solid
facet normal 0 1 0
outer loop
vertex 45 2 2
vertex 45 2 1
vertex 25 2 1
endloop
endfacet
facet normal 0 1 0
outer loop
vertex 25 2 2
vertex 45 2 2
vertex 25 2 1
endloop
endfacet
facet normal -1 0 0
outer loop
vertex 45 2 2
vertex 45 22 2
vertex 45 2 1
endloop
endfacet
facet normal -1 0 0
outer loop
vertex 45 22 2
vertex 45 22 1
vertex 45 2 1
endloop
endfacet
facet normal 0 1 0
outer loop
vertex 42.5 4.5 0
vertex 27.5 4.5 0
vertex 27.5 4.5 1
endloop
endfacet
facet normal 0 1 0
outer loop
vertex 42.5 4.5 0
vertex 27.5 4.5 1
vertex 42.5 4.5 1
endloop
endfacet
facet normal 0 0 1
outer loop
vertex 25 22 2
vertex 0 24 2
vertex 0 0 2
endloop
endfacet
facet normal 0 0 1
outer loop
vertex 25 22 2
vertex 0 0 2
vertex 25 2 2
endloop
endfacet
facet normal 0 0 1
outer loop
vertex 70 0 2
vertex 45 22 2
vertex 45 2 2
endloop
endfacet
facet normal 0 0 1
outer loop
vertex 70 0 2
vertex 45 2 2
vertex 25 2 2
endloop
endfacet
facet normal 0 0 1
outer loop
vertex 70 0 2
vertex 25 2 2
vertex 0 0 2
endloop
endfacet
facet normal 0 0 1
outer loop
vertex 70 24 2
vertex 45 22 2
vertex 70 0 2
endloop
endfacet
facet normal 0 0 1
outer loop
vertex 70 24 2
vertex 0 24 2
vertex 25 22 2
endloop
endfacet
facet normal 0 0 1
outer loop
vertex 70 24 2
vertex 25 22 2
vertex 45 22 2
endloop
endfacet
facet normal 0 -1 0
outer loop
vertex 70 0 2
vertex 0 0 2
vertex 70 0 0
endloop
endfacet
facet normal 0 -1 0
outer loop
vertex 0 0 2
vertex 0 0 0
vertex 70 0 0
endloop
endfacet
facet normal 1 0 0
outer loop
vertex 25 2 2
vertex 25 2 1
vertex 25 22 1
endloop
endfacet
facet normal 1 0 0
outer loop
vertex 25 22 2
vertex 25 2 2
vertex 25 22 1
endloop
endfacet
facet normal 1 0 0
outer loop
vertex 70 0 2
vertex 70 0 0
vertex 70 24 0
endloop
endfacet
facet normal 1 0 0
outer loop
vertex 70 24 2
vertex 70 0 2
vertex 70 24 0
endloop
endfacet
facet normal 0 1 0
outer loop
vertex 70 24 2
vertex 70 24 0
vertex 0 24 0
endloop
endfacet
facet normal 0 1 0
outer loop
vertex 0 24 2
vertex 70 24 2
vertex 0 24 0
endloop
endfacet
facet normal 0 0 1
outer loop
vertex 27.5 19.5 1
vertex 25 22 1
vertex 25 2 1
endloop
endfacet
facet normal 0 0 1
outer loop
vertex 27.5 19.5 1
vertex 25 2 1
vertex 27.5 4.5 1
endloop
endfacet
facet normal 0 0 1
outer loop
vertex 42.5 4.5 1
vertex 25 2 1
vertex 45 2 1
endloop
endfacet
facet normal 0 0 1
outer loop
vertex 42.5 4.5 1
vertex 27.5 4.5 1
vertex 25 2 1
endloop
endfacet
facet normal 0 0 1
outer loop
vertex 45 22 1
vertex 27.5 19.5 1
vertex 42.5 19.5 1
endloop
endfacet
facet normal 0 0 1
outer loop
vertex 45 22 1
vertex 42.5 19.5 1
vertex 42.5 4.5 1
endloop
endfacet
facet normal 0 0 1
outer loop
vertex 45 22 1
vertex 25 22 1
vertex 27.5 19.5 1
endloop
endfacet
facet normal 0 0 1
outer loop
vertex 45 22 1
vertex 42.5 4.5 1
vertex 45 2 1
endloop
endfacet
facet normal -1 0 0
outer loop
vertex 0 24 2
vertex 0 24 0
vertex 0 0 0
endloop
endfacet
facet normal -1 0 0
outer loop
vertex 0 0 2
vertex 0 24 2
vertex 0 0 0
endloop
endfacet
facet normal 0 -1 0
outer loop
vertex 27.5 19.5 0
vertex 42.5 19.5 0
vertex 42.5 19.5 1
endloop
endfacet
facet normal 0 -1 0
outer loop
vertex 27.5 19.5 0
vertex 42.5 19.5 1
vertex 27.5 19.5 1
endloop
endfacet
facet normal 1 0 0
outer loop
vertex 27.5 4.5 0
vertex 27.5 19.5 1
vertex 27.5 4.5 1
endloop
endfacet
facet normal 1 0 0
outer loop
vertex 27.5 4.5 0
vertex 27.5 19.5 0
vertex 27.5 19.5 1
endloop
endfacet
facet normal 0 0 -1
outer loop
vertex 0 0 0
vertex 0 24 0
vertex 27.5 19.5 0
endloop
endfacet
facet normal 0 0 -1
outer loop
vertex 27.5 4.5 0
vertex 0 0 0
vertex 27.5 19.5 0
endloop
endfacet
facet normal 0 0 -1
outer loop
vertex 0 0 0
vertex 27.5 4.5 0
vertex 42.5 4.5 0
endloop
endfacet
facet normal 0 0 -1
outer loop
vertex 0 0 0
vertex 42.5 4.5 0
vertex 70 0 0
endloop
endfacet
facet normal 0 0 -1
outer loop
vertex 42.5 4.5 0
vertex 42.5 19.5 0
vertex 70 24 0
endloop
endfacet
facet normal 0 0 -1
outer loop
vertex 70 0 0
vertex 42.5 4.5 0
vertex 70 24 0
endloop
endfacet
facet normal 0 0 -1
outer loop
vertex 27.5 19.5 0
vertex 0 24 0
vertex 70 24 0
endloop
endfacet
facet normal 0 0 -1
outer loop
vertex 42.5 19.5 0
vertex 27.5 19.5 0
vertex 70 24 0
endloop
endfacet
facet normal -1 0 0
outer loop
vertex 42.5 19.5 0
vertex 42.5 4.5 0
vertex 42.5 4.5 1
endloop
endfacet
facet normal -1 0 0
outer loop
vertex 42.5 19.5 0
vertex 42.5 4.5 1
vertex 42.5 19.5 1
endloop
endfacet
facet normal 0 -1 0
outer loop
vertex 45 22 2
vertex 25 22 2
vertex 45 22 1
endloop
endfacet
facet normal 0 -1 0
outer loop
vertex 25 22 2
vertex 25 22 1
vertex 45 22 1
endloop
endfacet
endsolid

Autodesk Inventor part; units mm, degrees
ref_plane "YZ Plane" through (0, 0, 0) normal (1, 0, 0) x (0, 1, 0)
ref_plane "XZ Plane" through (0, 0, 0) normal (0, 1, 0) x (-1, 0, 0)
ref_plane "XY Plane" through (0, 0, 0) normal (0, 0, 1) x (1, 0, 0)
sketch "Sketch1" plane through (0, 0, 0) normal (0, 0, 1) x (1, 0, 0)
  line L0 (0, 0) -> (70, 0)
  line L1 (70, 0) -> (70, 24)
  line L2 (70, 24) -> (0, 24)
  line L3 (0, 24) -> (0, 0)
  line L4 (27.5, 4.5) -> (42.5, 4.5)
  line L5 (42.5, 4.5) -> (42.5, 19.5)
  line L6 (42.5, 19.5) -> (27.5, 19.5)
  line L7 (27.5, 19.5) -> (27.5, 4.5)
  line L8 (27.5, 4.5) -> (42.5, 19.5) construction
  line L9 (42.5, 4.5) -> (27.5, 19.5) construction
  point P0 (35, 12)
  dimension "d0" = 70
  dimension "d1" = 24
  dimension "d2" = 15
  dimension "d3" = 15
extrude "Extrusion1" add sketch "Sketch1" along normal blind 1
sketch "Sketch2" plane through (0, 0, 1) normal (0, 0, 1) x (1, 0, 0)
  line L0 (27.5, 4.5) -> (27.5, 19.5) projected
  line L1 (27.5, 19.5) -> (42.5, 19.5) projected
  line L2 (42.5, 19.5) -> (42.5, 4.5) projected
  line L3 (42.5, 4.5) -> (27.5, 4.5) projected
  line L4 (0, 0) -> (70, 0) projected
  line L5 (70, 0) -> (70, 24) projected
  line L6 (70, 24) -> (0, 24) projected
  line L7 (0, 24) -> (0, 0) projected
  line L8 (45, 2) -> (25, 2)
  line L9 (25, 2) -> (25, 22)
  line L10 (25, 22) -> (45, 22)
  line L11 (45, 22) -> (45, 2)
  line L12 (45, 2) -> (25, 22) construction
  line L13 (25, 2) -> (45, 22) construction
  point P0 (35, 12)
  dimension "d6" = 20
  dimension "d7" = 20
extrude "Extrusion2" add sketch "Sketch2" along normal blind 1 contours L7 L6 L5 L4
properties part number "cellSTORM_coverslip_slide_adapter"
